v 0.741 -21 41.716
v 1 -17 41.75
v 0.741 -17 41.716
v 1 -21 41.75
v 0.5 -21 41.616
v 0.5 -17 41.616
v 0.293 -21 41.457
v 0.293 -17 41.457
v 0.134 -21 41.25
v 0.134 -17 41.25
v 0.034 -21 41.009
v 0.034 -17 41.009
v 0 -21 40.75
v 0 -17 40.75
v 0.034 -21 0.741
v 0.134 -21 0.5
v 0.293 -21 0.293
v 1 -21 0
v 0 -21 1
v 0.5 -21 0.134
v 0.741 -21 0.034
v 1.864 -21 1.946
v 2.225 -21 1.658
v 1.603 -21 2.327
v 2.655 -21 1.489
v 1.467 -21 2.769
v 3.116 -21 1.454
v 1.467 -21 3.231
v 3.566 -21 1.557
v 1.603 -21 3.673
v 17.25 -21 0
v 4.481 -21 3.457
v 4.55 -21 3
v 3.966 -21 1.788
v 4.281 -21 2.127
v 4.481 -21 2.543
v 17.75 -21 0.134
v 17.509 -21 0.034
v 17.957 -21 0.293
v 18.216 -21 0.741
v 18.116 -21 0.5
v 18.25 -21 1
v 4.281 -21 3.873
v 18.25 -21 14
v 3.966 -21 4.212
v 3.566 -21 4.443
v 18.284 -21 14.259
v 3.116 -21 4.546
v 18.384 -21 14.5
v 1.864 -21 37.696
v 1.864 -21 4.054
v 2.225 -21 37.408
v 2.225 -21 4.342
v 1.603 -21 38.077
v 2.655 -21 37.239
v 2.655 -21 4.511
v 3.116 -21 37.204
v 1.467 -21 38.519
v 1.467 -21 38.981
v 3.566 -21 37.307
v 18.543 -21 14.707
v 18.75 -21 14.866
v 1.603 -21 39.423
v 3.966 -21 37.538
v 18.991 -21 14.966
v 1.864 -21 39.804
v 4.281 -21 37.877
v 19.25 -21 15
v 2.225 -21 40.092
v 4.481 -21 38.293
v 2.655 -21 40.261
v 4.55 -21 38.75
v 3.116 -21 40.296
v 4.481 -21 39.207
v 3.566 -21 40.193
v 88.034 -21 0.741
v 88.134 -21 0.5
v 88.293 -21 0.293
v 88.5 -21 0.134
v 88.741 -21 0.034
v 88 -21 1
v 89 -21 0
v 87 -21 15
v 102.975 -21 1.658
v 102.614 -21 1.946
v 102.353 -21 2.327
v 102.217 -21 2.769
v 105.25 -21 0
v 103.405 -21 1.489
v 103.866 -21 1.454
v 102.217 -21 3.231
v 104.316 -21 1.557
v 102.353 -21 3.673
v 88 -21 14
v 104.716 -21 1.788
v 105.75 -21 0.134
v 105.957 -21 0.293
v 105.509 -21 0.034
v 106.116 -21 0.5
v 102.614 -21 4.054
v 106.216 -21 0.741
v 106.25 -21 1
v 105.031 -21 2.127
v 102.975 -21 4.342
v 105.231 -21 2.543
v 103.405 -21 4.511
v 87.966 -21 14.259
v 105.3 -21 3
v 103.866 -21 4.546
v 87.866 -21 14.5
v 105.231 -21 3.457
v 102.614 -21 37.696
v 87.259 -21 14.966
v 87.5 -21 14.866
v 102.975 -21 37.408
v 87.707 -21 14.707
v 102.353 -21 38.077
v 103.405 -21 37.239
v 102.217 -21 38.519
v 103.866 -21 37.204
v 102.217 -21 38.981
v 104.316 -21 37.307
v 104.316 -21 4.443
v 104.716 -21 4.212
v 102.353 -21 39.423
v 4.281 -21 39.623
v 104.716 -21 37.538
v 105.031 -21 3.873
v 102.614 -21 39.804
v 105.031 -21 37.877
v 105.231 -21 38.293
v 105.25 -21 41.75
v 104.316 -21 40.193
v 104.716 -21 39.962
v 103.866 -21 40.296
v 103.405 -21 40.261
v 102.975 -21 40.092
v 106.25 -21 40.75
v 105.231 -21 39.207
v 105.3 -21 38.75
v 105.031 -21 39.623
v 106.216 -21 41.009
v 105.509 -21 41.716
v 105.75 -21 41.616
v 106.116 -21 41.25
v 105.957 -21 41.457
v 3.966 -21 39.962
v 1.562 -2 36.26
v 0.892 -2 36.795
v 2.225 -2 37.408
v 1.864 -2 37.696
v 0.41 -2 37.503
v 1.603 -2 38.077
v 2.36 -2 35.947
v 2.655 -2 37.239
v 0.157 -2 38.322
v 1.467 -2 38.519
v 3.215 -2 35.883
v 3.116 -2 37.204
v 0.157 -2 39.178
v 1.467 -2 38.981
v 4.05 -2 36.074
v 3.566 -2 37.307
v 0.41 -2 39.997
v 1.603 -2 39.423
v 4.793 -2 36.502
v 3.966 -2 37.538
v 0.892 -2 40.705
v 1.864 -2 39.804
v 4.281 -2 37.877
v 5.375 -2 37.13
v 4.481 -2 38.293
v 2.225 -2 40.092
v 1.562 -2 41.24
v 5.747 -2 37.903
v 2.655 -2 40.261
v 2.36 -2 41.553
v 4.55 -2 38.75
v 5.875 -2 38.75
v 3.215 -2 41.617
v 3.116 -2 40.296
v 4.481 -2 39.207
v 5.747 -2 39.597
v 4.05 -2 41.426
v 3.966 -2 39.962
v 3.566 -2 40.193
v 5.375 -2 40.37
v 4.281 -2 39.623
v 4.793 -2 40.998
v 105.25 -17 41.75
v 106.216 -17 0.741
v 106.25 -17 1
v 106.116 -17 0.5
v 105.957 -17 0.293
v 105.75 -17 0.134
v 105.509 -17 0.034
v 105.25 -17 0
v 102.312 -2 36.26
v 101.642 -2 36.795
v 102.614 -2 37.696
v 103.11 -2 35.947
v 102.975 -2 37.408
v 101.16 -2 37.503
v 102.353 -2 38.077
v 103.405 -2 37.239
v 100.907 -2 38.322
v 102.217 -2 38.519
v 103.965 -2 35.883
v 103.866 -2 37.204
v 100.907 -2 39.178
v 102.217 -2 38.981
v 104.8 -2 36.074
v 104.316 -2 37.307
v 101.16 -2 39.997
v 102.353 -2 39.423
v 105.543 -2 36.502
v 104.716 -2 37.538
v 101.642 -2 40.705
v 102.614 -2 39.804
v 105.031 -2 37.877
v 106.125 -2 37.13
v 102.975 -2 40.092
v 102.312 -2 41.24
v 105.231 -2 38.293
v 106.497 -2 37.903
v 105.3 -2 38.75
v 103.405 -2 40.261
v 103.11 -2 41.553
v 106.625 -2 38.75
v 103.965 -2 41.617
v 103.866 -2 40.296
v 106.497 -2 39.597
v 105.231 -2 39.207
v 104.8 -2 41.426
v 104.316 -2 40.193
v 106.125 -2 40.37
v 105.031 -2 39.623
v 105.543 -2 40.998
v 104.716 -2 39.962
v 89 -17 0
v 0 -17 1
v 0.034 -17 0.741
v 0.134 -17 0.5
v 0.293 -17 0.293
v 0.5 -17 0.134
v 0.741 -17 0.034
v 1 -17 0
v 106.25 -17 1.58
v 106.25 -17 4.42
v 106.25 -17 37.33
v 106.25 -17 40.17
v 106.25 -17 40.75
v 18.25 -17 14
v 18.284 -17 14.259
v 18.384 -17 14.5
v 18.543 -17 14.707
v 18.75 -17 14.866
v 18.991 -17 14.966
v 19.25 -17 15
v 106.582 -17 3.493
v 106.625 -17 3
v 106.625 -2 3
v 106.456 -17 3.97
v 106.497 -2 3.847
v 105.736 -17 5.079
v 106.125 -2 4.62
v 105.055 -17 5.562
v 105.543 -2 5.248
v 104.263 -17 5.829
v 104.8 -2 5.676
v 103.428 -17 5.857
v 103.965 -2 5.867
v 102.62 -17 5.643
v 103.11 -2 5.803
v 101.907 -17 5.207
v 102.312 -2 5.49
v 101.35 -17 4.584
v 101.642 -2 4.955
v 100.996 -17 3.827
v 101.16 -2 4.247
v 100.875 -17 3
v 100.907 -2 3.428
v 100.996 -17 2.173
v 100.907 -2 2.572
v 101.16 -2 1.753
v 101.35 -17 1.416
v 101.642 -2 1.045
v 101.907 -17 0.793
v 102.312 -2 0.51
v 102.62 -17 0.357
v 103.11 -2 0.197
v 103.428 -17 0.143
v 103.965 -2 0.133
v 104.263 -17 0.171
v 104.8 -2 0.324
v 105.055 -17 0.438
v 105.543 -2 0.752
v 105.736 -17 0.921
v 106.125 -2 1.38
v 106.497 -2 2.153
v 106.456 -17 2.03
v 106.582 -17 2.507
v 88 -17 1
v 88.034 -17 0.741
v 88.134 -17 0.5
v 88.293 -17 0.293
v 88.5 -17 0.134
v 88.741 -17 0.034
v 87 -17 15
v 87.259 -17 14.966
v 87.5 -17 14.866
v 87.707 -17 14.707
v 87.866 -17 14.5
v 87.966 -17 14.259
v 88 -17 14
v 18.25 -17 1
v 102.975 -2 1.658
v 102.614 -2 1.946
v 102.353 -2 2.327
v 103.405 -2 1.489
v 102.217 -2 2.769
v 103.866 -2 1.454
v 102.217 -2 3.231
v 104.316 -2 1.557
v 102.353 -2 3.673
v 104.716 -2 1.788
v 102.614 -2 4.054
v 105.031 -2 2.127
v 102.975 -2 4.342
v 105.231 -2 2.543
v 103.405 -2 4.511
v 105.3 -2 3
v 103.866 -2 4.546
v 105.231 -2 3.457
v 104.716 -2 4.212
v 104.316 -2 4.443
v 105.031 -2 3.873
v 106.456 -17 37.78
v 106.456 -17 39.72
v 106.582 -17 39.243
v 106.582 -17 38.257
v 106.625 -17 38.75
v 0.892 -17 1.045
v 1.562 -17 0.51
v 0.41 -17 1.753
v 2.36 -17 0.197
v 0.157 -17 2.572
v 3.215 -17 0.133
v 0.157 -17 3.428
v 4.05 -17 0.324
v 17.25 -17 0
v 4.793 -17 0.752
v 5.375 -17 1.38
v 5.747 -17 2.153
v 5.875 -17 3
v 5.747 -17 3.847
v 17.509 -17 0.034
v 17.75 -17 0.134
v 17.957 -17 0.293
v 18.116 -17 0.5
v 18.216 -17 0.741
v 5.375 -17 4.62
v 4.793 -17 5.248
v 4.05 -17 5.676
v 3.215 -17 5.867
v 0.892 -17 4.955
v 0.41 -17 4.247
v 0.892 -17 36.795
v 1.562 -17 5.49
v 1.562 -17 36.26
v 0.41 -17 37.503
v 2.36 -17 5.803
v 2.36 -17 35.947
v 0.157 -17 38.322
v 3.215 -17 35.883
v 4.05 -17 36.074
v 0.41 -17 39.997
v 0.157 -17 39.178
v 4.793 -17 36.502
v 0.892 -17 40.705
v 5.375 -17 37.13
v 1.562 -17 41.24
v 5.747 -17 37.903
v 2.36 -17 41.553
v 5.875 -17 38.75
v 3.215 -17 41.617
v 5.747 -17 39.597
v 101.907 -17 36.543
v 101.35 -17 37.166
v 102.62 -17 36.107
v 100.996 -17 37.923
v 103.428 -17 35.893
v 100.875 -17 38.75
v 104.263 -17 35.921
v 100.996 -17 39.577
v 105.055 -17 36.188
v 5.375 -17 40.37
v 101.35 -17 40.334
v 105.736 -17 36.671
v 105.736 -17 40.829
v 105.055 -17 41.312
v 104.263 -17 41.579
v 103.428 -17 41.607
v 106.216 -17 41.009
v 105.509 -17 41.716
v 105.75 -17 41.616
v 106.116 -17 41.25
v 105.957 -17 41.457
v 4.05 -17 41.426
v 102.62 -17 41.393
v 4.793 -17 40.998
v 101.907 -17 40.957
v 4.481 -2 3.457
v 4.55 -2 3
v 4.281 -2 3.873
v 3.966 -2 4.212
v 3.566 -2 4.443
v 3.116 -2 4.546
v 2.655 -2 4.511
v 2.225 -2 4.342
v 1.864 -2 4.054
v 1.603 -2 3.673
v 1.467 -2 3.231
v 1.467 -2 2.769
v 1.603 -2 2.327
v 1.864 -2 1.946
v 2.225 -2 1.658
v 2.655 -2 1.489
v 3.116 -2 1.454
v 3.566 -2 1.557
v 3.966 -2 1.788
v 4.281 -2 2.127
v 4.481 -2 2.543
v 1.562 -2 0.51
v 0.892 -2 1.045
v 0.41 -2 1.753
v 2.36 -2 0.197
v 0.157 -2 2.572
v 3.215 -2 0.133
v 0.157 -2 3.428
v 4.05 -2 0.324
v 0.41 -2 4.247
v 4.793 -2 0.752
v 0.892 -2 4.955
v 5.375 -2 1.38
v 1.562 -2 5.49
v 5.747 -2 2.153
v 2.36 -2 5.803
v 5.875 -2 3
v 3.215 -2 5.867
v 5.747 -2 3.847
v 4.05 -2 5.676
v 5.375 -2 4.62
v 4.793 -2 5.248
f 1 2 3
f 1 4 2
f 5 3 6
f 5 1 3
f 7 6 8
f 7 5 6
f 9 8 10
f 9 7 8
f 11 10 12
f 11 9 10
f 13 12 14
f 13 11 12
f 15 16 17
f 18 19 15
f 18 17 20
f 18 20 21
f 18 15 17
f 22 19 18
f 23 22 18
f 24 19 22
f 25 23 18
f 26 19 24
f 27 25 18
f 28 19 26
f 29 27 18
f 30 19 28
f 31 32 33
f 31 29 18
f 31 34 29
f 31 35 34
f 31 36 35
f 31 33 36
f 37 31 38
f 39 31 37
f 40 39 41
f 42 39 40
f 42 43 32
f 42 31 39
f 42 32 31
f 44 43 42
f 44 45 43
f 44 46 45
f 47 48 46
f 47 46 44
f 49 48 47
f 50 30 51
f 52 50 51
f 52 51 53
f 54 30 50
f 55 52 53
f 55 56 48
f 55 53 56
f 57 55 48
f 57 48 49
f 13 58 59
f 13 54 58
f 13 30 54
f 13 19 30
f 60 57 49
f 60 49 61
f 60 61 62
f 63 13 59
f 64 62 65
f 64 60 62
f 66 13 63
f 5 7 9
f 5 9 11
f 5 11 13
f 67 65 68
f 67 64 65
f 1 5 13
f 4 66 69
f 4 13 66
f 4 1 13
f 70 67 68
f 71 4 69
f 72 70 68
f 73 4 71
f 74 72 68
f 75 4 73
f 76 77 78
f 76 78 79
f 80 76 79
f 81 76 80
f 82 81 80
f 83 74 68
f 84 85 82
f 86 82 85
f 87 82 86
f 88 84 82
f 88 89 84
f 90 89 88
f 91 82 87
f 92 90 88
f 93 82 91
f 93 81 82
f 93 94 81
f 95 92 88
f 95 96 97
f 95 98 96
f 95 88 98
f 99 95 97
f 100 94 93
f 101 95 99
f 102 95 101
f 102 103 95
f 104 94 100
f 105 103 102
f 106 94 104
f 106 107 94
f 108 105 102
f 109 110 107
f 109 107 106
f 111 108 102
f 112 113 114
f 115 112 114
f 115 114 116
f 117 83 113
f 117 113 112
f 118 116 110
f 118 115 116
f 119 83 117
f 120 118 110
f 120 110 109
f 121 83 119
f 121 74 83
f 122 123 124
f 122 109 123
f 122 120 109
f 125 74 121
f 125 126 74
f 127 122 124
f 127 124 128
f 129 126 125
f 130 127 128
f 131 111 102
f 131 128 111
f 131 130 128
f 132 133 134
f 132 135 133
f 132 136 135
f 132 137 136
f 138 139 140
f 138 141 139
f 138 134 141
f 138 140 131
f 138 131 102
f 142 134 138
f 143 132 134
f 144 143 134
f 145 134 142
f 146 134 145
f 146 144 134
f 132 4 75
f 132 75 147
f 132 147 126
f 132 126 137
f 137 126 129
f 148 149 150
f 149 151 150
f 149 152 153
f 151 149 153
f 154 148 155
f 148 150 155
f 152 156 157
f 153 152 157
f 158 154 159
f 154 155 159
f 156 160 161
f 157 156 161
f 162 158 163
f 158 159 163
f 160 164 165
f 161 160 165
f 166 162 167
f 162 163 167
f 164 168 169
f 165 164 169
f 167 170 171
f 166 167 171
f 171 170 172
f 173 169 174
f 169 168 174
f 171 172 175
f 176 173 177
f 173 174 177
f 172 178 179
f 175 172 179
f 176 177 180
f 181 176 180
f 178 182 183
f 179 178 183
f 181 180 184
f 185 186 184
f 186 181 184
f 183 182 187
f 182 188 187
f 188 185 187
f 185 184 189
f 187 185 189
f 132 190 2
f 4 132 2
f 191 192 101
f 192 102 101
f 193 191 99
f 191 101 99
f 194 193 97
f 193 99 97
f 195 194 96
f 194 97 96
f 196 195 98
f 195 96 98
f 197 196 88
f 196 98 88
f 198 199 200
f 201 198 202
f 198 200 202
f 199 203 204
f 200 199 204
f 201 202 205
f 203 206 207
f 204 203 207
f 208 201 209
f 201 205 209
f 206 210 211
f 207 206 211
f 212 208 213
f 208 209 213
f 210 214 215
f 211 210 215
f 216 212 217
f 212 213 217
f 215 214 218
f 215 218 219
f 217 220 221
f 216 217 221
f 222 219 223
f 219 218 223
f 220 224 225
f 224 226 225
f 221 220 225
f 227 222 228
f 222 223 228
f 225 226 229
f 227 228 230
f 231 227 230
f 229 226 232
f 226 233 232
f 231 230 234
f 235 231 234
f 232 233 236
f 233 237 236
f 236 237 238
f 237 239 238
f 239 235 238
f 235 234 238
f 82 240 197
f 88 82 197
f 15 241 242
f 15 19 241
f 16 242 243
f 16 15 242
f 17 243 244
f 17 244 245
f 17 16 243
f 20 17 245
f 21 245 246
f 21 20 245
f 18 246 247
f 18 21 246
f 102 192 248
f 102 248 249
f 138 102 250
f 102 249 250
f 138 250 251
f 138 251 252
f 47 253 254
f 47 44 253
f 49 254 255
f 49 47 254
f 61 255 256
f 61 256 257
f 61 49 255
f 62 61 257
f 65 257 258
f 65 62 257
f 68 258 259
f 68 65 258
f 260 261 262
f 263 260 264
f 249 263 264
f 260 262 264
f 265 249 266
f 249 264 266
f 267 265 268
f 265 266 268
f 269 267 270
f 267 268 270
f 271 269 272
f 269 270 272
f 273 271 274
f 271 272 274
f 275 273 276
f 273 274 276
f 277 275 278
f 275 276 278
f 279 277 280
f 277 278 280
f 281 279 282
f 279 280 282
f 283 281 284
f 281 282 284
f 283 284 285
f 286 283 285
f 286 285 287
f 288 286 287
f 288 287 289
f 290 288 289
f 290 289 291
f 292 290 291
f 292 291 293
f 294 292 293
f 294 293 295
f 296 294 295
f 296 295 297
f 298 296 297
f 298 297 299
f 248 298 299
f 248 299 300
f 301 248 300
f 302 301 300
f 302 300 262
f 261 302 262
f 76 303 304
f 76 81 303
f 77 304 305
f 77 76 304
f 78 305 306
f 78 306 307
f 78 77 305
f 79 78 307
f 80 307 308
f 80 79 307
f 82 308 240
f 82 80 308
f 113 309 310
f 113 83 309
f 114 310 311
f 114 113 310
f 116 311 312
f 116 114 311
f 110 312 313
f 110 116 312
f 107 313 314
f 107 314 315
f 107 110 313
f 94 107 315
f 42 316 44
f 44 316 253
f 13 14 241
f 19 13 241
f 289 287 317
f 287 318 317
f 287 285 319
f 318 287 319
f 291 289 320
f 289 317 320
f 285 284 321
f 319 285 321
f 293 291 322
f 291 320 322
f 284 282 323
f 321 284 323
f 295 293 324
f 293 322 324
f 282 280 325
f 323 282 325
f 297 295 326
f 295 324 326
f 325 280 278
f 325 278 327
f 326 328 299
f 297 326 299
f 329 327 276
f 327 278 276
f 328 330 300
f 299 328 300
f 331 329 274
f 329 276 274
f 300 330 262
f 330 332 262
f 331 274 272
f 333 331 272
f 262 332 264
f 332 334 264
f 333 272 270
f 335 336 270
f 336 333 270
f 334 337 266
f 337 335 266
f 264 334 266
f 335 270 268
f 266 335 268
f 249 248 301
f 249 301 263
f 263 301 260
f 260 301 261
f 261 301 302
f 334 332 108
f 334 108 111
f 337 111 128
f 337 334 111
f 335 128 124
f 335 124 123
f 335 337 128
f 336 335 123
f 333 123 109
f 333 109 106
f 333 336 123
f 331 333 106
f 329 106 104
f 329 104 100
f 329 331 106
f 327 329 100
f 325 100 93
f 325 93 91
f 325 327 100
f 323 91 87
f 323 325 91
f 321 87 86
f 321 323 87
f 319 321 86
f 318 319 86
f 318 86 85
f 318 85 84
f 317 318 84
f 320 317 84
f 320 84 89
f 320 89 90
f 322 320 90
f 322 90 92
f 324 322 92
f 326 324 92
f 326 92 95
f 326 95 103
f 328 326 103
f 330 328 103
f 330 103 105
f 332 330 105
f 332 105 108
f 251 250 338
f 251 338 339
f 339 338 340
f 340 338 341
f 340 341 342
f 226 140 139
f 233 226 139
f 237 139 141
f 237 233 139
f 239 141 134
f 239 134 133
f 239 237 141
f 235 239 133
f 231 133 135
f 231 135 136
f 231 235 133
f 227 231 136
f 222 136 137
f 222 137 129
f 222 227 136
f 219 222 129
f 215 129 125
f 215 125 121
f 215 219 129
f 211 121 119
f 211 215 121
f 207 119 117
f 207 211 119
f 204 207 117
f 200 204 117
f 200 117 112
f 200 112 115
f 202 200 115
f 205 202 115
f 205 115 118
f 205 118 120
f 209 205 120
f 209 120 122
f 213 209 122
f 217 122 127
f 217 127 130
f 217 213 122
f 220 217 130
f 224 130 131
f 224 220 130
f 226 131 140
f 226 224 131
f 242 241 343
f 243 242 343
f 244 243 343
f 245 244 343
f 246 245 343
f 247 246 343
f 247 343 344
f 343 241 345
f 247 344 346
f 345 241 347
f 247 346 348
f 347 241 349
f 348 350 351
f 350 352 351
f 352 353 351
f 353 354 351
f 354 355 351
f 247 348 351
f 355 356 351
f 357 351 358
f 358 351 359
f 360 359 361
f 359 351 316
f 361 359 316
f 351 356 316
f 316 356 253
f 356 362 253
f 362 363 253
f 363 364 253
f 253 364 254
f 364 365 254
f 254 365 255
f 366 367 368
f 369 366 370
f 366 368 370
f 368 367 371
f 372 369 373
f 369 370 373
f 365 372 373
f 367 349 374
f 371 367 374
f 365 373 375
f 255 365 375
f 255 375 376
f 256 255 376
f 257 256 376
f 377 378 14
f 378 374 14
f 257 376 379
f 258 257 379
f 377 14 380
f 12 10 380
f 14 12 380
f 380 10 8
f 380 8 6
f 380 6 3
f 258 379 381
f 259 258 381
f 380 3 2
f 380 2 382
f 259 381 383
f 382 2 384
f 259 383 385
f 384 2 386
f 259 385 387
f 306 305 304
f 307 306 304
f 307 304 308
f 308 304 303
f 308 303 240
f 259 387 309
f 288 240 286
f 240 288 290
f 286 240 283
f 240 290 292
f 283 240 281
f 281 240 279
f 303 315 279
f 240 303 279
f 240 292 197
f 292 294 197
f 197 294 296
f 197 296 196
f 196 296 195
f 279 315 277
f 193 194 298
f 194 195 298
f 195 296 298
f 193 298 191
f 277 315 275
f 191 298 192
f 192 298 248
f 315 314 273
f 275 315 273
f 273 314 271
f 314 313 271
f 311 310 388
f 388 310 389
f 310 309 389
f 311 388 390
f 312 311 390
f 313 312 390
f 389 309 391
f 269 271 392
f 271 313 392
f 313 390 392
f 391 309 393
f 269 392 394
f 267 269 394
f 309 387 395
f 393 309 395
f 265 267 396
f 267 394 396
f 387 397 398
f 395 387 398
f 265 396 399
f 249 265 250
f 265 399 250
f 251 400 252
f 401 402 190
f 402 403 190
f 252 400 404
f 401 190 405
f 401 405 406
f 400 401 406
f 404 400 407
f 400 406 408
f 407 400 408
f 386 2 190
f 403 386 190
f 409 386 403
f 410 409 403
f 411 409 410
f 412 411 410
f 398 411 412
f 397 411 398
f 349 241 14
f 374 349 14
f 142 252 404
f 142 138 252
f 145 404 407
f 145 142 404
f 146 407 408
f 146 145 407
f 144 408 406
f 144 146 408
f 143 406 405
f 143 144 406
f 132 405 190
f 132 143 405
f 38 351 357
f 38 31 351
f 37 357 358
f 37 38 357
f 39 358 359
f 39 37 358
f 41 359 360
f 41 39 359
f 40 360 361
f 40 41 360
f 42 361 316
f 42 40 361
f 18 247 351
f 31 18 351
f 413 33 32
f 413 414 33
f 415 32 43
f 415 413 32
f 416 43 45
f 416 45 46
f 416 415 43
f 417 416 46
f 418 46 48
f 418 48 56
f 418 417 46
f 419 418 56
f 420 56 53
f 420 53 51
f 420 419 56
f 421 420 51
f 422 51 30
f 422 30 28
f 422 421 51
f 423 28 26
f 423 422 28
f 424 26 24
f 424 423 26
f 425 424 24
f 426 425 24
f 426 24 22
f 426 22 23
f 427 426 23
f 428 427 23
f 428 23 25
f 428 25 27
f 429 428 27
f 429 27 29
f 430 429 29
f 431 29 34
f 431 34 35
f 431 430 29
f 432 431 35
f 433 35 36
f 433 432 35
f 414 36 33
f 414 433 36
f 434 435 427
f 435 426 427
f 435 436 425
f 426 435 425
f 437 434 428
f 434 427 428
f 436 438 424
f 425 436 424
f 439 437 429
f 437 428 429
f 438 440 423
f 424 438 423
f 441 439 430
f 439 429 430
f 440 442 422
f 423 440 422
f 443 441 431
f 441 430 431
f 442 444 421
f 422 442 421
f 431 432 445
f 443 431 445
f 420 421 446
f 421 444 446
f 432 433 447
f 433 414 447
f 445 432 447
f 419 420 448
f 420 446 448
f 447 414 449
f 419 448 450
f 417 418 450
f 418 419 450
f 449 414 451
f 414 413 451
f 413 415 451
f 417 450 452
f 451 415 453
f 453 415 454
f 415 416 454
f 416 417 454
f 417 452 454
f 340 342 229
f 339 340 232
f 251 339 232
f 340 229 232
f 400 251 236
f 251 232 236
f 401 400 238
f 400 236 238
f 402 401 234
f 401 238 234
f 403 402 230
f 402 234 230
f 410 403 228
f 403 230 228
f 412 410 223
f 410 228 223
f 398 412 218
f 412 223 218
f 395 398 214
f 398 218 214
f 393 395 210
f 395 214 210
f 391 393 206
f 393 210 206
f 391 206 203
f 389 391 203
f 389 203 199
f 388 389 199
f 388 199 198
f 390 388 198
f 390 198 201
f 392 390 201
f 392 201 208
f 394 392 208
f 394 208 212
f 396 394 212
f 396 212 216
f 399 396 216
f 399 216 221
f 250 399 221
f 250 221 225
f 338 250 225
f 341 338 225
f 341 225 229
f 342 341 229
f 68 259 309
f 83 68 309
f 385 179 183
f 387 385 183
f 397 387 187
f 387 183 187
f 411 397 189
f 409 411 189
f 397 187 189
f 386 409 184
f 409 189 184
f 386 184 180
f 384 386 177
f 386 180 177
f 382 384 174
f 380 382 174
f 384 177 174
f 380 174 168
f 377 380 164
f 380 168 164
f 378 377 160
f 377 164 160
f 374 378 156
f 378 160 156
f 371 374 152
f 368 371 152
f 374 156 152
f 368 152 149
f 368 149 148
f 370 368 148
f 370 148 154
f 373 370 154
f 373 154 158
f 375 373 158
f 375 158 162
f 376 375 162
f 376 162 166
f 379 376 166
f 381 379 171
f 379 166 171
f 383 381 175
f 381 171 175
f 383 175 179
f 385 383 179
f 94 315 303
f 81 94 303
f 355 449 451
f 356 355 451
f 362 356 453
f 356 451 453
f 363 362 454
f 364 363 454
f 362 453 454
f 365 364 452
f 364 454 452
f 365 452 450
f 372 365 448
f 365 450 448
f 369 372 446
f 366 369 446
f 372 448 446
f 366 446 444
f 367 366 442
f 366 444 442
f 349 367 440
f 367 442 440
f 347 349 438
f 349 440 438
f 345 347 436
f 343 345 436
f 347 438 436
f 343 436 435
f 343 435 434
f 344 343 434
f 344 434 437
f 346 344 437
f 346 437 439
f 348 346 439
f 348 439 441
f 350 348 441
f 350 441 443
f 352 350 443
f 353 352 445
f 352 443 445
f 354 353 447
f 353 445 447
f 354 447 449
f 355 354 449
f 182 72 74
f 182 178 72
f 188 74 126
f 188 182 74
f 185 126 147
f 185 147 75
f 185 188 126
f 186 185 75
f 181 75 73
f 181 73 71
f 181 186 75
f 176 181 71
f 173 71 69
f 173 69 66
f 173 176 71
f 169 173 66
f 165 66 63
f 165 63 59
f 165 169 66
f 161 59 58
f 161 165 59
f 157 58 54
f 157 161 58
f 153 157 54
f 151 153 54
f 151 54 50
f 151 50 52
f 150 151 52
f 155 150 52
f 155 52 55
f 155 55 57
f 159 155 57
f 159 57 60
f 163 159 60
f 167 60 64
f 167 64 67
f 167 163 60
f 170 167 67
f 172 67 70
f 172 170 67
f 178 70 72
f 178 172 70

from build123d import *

# Parameters (mm, degrees)
SKETCH026_R                = 2.875
SKETCH026_R_2              = 1.55
EXTRUDE026_DEPTH           = 15
EXTRUDE026_PLACEMENT_ANGLE = 270
SKETCH025_R                = 1.55
EXTRUDE025_DEPTH           = 4
EXTRUDE025_PLACEMENT_ANGLE = 270
FILLET029_R                = 1


with BuildPart() as spacer001:
    # Sketch026 → Extrude026 (new body)
    with BuildSketch(Plane.YZ):
        with Locations((3, 38.75)):
            Circle(SKETCH026_R)
        with Locations((3, 38.75)):
            Circle(SKETCH026_R_2, mode=Mode.SUBTRACT)
        with Locations((3, 3)):
            Circle(SKETCH026_R)
        with Locations((3, 3)):
            Circle(SKETCH026_R_2, mode=Mode.SUBTRACT)
        with Locations((103.75, 3)):
            Circle(SKETCH026_R)
        with Locations((103.75, 3)):
            Circle(SKETCH026_R_2, mode=Mode.SUBTRACT)
        with Locations((103.75, 38.75)):
            Circle(SKETCH026_R)
        with Locations((103.75, 38.75)):
            Circle(SKETCH026_R_2, mode=Mode.SUBTRACT)
    extrude(amount=EXTRUDE026_DEPTH)


with BuildPart() as spacer001_1:
    # Extrude026 placement: moved
    add(spacer001.part.moved(Location((0, -2, 0))).rotate(Axis((0, -2, 0), (0, 0, 1)), EXTRUDE026_PLACEMENT_ANGLE))


with BuildPart() as top_fillet001:
    # Sketch025 → Extrude025 (new body)
    with BuildSketch(Plane.YZ):
        Polygon((106.25, 0), (106.25, 41.75), (0, 41.75), (0, 0), (18.25, 0), (18.25, 15), (88, 15), (88, 0), align=None)
        with Locations((3, 3)):
            Circle(SKETCH025_R, mode=Mode.SUBTRACT)
        with Locations((3, 38.75)):
            Circle(SKETCH025_R, mode=Mode.SUBTRACT)
        with Locations((103.75, 38.75)):
            Circle(SKETCH025_R, mode=Mode.SUBTRACT)
        with Locations((103.75, 3)):
            Circle(SKETCH025_R, mode=Mode.SUBTRACT)
    extrude(amount=EXTRUDE025_DEPTH)


with BuildPart() as top_fillet001_1:
    # Extrude025 placement: moved
    add(top_fillet001.part.moved(Location((0, -17, 0))).rotate(Axis((0, -17, 0), (0, 0, 1)), EXTRUDE025_PLACEMENT_ANGLE))

    # Fusion029: union spacer001
    add(spacer001_1.part)

    # Fillet029
    fillet029_edges = [top_fillet001_1.edges().sort_by_distance(p)[0] for p in [
        (106.25, -19, 0),
        (106.25, -19, 41.75),
        (88, -19, 0),
        (0, -19, 41.75),
        (88, -19, 15),
        (0, -19, 0),
        (18.25, -19, 15),
        (18.25, -19, 0),
    ]]
    fillet(fillet029_edges, radius=FILLET029_R)


solid = top_fillet001_1.part
